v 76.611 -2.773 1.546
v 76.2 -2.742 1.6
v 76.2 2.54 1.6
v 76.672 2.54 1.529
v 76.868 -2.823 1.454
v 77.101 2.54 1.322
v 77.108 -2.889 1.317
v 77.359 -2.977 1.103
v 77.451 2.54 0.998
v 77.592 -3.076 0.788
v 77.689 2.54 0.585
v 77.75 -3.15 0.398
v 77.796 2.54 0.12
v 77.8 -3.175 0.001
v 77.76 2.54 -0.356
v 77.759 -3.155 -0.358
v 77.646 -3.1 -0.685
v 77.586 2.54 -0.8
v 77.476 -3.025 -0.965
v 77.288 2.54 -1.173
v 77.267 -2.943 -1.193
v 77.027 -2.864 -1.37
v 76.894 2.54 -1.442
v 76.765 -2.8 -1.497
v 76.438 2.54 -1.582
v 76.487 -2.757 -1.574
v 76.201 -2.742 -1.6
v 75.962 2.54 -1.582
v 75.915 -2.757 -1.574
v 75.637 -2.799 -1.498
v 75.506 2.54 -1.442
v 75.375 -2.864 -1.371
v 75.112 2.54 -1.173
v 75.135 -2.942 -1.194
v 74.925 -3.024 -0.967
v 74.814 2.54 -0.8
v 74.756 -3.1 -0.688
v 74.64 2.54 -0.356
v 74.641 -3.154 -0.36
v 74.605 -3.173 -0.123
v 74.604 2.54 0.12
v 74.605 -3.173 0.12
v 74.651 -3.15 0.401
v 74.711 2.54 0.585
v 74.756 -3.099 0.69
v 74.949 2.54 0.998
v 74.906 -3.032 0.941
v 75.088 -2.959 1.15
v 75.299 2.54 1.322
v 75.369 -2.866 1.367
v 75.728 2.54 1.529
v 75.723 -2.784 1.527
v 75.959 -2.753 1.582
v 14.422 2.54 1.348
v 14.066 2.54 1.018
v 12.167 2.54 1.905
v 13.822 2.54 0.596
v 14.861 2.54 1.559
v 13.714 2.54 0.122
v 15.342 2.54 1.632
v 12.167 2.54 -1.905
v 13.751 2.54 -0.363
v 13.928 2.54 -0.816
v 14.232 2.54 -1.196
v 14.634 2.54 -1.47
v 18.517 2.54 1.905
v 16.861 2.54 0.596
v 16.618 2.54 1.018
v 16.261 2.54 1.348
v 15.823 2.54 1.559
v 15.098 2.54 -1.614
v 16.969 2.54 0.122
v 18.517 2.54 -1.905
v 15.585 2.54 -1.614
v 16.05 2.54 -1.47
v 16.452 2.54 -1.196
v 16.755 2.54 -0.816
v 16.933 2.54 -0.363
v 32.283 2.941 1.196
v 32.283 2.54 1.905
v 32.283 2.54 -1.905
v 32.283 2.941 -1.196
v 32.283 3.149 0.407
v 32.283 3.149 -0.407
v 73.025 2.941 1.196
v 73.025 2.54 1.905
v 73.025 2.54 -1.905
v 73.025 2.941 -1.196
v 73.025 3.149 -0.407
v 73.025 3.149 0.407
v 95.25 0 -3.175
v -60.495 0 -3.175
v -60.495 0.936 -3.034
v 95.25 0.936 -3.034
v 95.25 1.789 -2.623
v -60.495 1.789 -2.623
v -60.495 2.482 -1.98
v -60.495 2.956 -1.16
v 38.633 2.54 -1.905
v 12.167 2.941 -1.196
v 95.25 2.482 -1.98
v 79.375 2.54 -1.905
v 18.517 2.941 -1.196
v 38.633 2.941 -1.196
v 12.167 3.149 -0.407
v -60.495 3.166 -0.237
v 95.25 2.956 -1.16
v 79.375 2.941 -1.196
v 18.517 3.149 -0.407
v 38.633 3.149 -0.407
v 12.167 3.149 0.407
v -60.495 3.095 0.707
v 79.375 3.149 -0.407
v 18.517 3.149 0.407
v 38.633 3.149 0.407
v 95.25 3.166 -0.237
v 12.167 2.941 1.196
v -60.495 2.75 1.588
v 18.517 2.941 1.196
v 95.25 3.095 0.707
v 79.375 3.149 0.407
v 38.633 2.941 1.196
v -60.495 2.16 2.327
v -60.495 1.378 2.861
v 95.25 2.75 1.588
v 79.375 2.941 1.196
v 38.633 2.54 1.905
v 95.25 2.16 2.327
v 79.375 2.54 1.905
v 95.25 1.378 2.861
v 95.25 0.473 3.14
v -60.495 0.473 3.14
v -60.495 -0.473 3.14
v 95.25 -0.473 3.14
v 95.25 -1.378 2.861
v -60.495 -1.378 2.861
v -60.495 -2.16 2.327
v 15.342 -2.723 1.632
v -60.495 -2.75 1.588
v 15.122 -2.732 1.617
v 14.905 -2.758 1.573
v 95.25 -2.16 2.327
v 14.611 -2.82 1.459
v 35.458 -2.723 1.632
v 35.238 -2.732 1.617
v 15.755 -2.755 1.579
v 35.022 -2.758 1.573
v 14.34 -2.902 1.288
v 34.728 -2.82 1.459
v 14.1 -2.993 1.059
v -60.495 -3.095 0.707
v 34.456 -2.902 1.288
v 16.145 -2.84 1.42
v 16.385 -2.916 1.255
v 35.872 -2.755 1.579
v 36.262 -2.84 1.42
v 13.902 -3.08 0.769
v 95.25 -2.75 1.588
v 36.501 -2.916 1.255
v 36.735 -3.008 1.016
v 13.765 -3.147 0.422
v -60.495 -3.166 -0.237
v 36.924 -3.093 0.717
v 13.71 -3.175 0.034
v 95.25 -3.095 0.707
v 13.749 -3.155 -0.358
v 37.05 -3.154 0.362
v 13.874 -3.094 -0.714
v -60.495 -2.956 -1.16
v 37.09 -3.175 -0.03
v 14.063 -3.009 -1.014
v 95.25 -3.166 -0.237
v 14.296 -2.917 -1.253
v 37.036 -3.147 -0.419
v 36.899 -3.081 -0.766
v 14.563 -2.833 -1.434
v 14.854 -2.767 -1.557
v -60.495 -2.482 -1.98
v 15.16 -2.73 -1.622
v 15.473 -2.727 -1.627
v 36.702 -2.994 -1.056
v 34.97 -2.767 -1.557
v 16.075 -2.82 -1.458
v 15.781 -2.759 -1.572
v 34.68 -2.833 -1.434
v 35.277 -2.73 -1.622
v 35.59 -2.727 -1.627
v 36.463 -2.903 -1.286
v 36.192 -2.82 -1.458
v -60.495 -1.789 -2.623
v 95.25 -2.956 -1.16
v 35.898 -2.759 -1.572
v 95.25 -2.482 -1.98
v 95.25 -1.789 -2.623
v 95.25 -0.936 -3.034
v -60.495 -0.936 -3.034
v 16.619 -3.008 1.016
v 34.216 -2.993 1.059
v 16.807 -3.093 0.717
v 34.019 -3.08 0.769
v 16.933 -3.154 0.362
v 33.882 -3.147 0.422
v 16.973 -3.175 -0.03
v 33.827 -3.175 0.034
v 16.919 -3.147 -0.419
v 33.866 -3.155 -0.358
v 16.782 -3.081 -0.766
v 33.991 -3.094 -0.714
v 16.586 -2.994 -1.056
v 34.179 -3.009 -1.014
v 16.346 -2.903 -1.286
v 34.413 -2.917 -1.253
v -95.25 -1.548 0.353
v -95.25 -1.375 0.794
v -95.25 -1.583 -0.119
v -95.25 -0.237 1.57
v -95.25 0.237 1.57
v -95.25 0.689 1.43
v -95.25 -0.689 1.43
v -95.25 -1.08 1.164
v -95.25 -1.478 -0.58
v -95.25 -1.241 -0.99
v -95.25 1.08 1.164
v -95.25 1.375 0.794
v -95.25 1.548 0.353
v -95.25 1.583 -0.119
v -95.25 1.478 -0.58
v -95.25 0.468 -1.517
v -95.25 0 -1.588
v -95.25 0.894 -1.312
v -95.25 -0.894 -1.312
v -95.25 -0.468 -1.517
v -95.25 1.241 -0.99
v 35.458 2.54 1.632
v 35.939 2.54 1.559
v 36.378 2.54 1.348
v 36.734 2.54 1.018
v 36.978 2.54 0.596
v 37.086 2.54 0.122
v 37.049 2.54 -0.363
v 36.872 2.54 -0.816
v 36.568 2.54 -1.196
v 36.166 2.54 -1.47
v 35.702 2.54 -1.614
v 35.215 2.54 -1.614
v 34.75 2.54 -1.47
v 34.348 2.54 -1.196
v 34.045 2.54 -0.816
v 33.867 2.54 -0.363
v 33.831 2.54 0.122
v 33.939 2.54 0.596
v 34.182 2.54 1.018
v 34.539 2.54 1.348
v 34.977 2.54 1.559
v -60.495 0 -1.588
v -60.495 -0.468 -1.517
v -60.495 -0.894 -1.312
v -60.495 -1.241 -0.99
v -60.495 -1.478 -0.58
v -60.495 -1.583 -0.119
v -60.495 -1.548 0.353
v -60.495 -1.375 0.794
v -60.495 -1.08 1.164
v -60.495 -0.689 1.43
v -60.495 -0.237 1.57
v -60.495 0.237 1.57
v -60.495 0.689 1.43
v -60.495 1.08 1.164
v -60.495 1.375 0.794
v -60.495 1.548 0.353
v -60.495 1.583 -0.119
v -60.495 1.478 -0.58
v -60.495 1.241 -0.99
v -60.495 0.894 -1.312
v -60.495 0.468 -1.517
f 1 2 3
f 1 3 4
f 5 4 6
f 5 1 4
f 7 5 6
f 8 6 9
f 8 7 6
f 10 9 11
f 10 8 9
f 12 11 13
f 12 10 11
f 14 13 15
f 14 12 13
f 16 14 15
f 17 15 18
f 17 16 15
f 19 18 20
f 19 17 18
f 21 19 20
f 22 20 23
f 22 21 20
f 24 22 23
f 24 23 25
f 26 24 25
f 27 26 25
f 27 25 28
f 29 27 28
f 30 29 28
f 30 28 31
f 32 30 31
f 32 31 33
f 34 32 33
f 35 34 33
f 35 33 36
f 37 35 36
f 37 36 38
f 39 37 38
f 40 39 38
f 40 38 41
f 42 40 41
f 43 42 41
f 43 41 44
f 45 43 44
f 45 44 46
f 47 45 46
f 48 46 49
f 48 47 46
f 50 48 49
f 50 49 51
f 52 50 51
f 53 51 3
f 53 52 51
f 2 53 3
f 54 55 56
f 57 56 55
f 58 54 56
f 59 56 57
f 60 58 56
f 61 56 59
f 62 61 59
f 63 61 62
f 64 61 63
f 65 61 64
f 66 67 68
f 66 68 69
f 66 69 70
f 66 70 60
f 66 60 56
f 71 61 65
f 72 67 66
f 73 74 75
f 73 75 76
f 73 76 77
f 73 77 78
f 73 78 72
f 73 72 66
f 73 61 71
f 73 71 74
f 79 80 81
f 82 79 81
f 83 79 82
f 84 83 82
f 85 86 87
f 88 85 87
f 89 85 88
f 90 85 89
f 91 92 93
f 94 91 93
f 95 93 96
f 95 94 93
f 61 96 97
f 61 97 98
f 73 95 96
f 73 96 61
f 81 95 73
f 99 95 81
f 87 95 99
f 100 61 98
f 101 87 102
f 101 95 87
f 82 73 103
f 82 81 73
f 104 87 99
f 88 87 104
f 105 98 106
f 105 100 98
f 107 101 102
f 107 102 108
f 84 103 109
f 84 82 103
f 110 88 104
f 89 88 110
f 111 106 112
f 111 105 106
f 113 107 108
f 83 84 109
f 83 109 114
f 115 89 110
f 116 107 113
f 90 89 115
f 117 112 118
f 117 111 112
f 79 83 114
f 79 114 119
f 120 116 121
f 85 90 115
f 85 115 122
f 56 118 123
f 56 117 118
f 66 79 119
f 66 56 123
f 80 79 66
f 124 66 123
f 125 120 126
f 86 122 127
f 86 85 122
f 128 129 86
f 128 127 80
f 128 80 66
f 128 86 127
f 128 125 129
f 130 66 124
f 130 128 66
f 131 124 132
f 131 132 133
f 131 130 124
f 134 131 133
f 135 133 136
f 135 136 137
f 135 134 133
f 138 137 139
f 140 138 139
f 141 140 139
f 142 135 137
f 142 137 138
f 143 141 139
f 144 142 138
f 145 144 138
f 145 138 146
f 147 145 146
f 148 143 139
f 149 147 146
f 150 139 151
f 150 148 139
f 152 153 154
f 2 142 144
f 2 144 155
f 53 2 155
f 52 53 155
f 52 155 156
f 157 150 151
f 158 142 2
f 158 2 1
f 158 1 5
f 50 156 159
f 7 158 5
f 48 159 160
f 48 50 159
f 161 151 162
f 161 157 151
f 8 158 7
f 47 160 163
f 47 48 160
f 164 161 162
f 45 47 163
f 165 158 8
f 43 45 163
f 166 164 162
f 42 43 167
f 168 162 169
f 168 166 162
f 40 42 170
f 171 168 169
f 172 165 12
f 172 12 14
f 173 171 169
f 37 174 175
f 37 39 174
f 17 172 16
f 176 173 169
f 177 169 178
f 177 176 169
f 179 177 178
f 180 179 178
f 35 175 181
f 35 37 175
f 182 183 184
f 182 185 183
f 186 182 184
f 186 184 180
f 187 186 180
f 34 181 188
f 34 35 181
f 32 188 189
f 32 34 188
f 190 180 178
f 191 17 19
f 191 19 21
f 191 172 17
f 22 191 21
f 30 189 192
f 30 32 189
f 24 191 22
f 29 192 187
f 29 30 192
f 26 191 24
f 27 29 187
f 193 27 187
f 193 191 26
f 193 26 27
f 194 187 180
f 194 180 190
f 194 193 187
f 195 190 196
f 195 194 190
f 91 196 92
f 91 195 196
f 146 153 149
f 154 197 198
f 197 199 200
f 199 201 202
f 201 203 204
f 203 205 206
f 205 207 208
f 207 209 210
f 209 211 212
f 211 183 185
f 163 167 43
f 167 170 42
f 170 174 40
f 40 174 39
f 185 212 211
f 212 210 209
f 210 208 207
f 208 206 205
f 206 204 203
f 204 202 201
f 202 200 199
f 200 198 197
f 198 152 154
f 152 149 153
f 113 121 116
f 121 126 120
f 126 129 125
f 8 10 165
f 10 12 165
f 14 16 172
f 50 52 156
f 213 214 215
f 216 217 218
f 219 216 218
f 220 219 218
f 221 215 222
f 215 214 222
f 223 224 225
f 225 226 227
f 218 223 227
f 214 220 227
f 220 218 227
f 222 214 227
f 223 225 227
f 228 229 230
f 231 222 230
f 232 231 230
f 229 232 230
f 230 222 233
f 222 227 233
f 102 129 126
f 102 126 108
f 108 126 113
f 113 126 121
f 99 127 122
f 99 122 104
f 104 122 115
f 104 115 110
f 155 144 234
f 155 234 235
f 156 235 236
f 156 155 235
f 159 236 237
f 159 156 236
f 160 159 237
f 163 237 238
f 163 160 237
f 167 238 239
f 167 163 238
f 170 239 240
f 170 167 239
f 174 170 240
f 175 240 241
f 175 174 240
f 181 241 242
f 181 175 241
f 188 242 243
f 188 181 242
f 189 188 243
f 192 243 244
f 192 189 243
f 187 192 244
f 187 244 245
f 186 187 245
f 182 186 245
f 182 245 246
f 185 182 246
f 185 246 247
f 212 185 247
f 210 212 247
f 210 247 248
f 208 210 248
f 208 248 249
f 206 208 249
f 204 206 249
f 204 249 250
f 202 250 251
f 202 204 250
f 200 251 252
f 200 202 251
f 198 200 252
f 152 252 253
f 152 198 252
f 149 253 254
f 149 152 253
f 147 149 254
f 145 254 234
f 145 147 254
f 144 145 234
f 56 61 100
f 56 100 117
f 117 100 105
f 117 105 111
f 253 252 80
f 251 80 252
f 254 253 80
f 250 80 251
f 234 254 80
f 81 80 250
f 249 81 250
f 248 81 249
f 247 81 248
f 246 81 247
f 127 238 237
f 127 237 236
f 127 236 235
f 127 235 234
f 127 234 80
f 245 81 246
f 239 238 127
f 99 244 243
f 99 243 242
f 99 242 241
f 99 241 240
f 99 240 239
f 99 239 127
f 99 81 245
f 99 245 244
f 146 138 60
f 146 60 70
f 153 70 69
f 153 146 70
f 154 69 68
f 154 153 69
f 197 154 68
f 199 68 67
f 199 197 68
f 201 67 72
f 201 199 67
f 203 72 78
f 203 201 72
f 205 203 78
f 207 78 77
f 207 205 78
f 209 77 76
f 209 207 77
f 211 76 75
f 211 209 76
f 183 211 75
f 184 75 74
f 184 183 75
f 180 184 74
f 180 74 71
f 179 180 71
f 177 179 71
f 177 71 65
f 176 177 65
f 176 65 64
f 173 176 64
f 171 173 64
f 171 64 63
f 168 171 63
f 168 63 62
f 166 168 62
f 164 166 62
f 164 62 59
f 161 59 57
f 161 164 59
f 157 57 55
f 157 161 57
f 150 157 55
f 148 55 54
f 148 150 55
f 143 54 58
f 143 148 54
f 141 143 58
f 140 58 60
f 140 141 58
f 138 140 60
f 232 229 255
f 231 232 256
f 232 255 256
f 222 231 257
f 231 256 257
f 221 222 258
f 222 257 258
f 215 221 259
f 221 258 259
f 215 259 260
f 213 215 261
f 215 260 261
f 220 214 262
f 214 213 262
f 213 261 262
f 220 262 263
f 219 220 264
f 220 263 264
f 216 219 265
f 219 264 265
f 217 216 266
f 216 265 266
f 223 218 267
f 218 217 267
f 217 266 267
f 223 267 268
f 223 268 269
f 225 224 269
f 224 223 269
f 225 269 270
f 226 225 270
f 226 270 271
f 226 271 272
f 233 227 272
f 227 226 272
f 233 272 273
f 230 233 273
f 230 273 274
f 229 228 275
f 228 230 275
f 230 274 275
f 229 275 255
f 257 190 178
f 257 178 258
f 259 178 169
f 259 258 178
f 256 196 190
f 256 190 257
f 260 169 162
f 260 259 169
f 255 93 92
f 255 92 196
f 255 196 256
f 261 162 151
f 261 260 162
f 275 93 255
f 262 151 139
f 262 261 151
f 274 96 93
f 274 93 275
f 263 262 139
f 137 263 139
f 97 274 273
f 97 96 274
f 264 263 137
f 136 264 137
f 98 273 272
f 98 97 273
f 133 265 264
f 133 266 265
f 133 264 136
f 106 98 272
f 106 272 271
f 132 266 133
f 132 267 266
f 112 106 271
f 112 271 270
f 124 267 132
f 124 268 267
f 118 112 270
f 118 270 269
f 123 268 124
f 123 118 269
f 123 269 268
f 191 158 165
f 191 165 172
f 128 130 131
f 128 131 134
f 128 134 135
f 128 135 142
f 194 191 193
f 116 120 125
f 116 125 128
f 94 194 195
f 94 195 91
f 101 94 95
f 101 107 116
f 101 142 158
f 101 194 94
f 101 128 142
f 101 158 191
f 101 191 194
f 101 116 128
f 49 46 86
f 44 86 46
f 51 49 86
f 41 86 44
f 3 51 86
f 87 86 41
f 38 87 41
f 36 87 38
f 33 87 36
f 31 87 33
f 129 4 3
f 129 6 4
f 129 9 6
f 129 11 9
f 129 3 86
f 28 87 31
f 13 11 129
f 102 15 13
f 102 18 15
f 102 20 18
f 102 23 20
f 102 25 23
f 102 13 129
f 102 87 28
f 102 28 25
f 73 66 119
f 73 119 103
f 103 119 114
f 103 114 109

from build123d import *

# Parameters (mm, degrees)
SKETCH2_R                        = 3.175
MAIN_SHAFT_DEPTH                 = 95.25
PIN_HOLES_CUT_DEPTH              = 96.355774602
PIN_HOLES_CUT_DEPTH_BACK         = 96.355774602
SKETCH3_R                        = 1.63195
FLAT_FOR_DRILLING_CUT_DEPTH      = 96.355774709
FLAT_FOR_DRILLING_CUT_DEPTH_BACK = 96.355774709
SKETCH5_W                        = 6.35
SKETCH5_H                        = 0.635
F_1_8_CUT_DEPTH                  = 191.552909422
F_1_8_CUT_DEPTH_BACK             = 34.75482
SKETCH6_R                        = 3.175
SKETCH6_R_2                      = 1.5875
CUT_EXTRUDE1_DEPTH               = 96.355774709
CUT_EXTRUDE1_DEPTH_BACK          = 96.355774709
SKETCH7_R                        = 1.6
CUT_EXTRUDE2_START               = 2.54
SKETCH7_3_W                      = 6.35
SKETCH7_3_H                      = 13.17395124
SKETCH7_3_R                      = 1.6
CUT_EXTRUDE2_DEPTH               = 93.815774709


with BuildPart() as part:
    # Sketch2 → Main Shaft (new, symmetric)
    with BuildSketch(Plane(origin=(0, 0, 0), x_dir=(0, 0, -1), z_dir=(1, 0, 0))):
        Circle(SKETCH2_R)
    extrude(amount=MAIN_SHAFT_DEPTH, both=True)

    # Sketch3 → Pin Holes Cut (cut, two sides: drawn at the far end of the back side and taken through both)
    with BuildSketch(Plane(origin=(0, 0, 0), x_dir=(1, 0, 0), z_dir=(0, 1, 0)).offset(-PIN_HOLES_CUT_DEPTH_BACK)):
        with Locations((15.3416, 0)):
            Circle(SKETCH3_R)
        with Locations((35.4584, 0)):
            Circle(SKETCH3_R)
    extrude(amount=PIN_HOLES_CUT_DEPTH + PIN_HOLES_CUT_DEPTH_BACK, mode=Mode.SUBTRACT)

    # Sketch5 → Flat for drilling Cut (cut, two sides: drawn at the far end of the back side and taken through both)
    with BuildSketch(Plane.XY.offset(-FLAT_FOR_DRILLING_CUT_DEPTH_BACK)):
        with Locations((15.3416, 2.8575)):
            Rectangle(SKETCH5_W, SKETCH5_H)
        with Locations((35.45832639, 2.8575)):
            Rectangle(SKETCH5_W, SKETCH5_H)
    extrude(amount=FLAT_FOR_DRILLING_CUT_DEPTH + FLAT_FOR_DRILLING_CUT_DEPTH_BACK, mode=Mode.SUBTRACT)

    # Sketch6 → 1/8 Cut (cut, two sides: drawn at the far end of the back side and taken through both)
    with BuildSketch(Plane.ZY.offset(95.25).offset(-F_1_8_CUT_DEPTH_BACK)):
        Circle(SKETCH6_R)
        Circle(SKETCH6_R_2, mode=Mode.SUBTRACT)
    extrude(amount=F_1_8_CUT_DEPTH + F_1_8_CUT_DEPTH_BACK, mode=Mode.SUBTRACT)

    # Sketch7 → Cut-Extrude1 (cut, two sides: drawn at the far end of the back side and taken through both)
    with BuildSketch(Plane(origin=(0, 0, 0), x_dir=(1, 0, 0), z_dir=(0, 1, 0)).offset(-CUT_EXTRUDE1_DEPTH_BACK)):
        with Locations((76.2, 0)):
            Circle(SKETCH7_R)
    extrude(amount=CUT_EXTRUDE1_DEPTH + CUT_EXTRUDE1_DEPTH_BACK, mode=Mode.SUBTRACT)

    # Sketch7<3> → Cut-Extrude2 (cut, through all)
    with BuildSketch(Plane(origin=(0, 0, 0), x_dir=(1, 0, 0), z_dir=(0, 1, 0)).offset(CUT_EXTRUDE2_START)):
        with Locations((76.2, 0)):
            Rectangle(SKETCH7_3_W, SKETCH7_3_H)
        with Locations((76.2, 0)):
            Circle(SKETCH7_3_R, mode=Mode.SUBTRACT)
    extrude(amount=CUT_EXTRUDE2_DEPTH, mode=Mode.SUBTRACT)


solid = part.part
